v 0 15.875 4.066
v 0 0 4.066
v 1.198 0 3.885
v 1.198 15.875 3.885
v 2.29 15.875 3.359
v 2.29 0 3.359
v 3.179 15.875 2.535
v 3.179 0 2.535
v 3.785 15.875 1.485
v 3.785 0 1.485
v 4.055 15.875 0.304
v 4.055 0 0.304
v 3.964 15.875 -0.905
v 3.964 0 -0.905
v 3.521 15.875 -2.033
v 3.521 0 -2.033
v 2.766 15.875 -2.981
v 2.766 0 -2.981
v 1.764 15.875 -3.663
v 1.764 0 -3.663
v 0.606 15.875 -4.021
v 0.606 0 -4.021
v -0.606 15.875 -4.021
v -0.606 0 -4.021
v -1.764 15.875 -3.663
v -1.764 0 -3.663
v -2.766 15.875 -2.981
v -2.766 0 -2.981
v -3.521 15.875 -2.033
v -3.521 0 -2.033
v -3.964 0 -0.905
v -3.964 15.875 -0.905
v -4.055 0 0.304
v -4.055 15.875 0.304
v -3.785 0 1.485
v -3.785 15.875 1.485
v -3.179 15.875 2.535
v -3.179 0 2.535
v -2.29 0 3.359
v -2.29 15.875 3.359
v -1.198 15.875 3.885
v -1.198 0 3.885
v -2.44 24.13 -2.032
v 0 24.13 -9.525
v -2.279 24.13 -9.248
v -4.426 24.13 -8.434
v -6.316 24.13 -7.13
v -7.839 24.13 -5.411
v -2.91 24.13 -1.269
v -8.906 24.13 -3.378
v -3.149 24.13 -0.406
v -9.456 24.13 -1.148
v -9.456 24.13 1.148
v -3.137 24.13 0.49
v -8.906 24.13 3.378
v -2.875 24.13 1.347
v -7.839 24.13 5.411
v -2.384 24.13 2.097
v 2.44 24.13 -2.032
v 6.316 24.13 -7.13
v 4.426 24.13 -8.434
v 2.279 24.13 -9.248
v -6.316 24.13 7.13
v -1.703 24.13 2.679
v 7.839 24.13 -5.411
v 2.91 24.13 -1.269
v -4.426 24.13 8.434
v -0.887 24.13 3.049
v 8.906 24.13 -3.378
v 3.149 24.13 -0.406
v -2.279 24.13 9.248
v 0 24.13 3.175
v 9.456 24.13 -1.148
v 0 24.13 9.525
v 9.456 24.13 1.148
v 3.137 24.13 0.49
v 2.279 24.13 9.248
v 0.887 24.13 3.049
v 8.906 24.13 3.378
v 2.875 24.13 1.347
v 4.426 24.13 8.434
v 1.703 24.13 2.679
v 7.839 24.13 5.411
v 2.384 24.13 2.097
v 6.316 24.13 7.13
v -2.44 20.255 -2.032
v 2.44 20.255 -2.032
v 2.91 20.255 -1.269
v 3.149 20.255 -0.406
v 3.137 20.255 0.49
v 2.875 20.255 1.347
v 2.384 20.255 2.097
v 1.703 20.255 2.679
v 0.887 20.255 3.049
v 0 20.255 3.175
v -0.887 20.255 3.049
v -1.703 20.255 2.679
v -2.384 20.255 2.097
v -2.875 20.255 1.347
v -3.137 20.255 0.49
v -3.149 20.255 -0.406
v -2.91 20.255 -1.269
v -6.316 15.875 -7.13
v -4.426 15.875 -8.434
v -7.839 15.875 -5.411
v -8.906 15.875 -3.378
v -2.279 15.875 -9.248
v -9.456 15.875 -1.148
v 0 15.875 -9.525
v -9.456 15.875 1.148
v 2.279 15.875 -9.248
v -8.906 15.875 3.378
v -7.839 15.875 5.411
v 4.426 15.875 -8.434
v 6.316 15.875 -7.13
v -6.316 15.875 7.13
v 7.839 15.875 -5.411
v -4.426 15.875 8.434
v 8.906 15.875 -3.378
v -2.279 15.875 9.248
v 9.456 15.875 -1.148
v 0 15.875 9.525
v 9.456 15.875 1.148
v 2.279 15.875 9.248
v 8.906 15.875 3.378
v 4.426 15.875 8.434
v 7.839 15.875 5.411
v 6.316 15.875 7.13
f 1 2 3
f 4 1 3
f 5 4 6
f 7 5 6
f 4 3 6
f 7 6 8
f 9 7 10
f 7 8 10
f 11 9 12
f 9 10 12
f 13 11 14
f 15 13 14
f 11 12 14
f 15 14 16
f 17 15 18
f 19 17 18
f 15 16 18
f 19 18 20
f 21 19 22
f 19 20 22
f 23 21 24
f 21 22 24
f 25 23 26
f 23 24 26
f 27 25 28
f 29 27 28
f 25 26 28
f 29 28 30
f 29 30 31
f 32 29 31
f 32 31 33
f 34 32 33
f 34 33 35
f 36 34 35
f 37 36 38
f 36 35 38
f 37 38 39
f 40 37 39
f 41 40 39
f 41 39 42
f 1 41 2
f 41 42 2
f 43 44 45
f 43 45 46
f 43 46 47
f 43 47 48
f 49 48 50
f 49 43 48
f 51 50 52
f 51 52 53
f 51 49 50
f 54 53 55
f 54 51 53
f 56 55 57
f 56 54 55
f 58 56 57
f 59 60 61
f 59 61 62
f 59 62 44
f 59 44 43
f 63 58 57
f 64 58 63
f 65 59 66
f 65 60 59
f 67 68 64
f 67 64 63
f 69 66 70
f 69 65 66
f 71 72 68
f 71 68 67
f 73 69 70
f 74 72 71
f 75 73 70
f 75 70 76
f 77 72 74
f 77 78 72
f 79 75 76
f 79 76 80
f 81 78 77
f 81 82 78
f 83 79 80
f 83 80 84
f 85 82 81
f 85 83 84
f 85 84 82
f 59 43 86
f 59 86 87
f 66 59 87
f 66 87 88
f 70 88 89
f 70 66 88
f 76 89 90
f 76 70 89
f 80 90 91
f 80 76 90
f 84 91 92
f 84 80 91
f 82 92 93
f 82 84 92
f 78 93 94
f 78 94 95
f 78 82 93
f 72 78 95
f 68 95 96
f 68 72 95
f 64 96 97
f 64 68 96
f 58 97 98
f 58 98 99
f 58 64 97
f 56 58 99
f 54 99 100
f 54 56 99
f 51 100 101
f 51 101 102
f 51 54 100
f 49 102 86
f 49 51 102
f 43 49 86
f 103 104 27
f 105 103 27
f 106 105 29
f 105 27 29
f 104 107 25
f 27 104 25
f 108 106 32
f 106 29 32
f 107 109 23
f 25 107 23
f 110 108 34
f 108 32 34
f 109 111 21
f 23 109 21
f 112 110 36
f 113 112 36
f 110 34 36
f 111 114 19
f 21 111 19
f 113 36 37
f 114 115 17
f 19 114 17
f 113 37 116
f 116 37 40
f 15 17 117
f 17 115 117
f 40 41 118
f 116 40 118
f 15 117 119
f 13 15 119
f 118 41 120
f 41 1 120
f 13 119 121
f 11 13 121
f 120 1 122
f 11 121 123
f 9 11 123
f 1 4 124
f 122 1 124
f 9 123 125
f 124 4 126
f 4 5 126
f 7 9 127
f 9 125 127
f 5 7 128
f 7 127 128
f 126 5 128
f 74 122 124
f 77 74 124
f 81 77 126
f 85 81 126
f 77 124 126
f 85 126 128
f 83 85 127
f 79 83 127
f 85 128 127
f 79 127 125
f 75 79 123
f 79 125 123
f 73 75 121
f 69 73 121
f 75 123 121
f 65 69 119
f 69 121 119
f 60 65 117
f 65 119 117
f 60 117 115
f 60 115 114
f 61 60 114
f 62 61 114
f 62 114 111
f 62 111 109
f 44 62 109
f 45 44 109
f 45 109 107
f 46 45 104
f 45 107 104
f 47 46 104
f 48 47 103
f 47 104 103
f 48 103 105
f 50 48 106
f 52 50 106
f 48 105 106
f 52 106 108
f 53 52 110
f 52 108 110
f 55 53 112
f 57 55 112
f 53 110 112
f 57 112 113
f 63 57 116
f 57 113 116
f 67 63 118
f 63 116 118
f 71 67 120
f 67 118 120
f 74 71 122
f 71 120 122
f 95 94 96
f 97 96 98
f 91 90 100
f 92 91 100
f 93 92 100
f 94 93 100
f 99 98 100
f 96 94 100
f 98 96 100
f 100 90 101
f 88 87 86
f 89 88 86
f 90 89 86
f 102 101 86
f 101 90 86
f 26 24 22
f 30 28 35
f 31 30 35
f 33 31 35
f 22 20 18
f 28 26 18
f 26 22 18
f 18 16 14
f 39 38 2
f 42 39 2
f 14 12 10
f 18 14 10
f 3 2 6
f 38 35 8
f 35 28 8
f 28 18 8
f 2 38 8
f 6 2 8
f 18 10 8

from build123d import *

# Parameters (mm, degrees)
SKETCH2_R           = 4.066
BOSS_EXTRUDE1_DEPTH = 15.875
SKETCH3_R           = 9.525
BOSS_EXTRUDE2_DEPTH = 8.255
CUT_EXTRUDE1_DEPTH  = 3.875


with BuildPart() as part:
    # Sketch2 → Boss-Extrude1 (new body)
    with BuildSketch(Plane(origin=(0, 0, 0), x_dir=(1, 0, 0), z_dir=(0, 1, 0))):
        with Locations(Location((0, 0, 0), (0, 0, 270))):
            Circle(SKETCH2_R)
    extrude(amount=BOSS_EXTRUDE1_DEPTH)

    # Sketch3 → Boss-Extrude2 (add)
    with BuildSketch(Plane(origin=(0, 15.875, 0), x_dir=(1, 0, 0), z_dir=(0, 1, 0))):
        with Locations(Location((0, 0, 0), (0, 0, 270))):
            Circle(SKETCH3_R)
    extrude(amount=BOSS_EXTRUDE2_DEPTH)

    # Sketch4 → Cut-Extrude1 (cut)
    with BuildSketch(Plane(origin=(0, 24.13, 0), x_dir=(1, 0, 0), z_dir=(0, 1, 0))):
        with BuildLine():
            Line((-2.439590334, 2.032), (2.439590334, 2.032))
            ThreePointArc((2.439590334, 2.032), (0, -3.175), (-2.439590334, 2.032))
        make_face()
    extrude(amount=-CUT_EXTRUDE1_DEPTH, mode=Mode.SUBTRACT)


solid = part.part
